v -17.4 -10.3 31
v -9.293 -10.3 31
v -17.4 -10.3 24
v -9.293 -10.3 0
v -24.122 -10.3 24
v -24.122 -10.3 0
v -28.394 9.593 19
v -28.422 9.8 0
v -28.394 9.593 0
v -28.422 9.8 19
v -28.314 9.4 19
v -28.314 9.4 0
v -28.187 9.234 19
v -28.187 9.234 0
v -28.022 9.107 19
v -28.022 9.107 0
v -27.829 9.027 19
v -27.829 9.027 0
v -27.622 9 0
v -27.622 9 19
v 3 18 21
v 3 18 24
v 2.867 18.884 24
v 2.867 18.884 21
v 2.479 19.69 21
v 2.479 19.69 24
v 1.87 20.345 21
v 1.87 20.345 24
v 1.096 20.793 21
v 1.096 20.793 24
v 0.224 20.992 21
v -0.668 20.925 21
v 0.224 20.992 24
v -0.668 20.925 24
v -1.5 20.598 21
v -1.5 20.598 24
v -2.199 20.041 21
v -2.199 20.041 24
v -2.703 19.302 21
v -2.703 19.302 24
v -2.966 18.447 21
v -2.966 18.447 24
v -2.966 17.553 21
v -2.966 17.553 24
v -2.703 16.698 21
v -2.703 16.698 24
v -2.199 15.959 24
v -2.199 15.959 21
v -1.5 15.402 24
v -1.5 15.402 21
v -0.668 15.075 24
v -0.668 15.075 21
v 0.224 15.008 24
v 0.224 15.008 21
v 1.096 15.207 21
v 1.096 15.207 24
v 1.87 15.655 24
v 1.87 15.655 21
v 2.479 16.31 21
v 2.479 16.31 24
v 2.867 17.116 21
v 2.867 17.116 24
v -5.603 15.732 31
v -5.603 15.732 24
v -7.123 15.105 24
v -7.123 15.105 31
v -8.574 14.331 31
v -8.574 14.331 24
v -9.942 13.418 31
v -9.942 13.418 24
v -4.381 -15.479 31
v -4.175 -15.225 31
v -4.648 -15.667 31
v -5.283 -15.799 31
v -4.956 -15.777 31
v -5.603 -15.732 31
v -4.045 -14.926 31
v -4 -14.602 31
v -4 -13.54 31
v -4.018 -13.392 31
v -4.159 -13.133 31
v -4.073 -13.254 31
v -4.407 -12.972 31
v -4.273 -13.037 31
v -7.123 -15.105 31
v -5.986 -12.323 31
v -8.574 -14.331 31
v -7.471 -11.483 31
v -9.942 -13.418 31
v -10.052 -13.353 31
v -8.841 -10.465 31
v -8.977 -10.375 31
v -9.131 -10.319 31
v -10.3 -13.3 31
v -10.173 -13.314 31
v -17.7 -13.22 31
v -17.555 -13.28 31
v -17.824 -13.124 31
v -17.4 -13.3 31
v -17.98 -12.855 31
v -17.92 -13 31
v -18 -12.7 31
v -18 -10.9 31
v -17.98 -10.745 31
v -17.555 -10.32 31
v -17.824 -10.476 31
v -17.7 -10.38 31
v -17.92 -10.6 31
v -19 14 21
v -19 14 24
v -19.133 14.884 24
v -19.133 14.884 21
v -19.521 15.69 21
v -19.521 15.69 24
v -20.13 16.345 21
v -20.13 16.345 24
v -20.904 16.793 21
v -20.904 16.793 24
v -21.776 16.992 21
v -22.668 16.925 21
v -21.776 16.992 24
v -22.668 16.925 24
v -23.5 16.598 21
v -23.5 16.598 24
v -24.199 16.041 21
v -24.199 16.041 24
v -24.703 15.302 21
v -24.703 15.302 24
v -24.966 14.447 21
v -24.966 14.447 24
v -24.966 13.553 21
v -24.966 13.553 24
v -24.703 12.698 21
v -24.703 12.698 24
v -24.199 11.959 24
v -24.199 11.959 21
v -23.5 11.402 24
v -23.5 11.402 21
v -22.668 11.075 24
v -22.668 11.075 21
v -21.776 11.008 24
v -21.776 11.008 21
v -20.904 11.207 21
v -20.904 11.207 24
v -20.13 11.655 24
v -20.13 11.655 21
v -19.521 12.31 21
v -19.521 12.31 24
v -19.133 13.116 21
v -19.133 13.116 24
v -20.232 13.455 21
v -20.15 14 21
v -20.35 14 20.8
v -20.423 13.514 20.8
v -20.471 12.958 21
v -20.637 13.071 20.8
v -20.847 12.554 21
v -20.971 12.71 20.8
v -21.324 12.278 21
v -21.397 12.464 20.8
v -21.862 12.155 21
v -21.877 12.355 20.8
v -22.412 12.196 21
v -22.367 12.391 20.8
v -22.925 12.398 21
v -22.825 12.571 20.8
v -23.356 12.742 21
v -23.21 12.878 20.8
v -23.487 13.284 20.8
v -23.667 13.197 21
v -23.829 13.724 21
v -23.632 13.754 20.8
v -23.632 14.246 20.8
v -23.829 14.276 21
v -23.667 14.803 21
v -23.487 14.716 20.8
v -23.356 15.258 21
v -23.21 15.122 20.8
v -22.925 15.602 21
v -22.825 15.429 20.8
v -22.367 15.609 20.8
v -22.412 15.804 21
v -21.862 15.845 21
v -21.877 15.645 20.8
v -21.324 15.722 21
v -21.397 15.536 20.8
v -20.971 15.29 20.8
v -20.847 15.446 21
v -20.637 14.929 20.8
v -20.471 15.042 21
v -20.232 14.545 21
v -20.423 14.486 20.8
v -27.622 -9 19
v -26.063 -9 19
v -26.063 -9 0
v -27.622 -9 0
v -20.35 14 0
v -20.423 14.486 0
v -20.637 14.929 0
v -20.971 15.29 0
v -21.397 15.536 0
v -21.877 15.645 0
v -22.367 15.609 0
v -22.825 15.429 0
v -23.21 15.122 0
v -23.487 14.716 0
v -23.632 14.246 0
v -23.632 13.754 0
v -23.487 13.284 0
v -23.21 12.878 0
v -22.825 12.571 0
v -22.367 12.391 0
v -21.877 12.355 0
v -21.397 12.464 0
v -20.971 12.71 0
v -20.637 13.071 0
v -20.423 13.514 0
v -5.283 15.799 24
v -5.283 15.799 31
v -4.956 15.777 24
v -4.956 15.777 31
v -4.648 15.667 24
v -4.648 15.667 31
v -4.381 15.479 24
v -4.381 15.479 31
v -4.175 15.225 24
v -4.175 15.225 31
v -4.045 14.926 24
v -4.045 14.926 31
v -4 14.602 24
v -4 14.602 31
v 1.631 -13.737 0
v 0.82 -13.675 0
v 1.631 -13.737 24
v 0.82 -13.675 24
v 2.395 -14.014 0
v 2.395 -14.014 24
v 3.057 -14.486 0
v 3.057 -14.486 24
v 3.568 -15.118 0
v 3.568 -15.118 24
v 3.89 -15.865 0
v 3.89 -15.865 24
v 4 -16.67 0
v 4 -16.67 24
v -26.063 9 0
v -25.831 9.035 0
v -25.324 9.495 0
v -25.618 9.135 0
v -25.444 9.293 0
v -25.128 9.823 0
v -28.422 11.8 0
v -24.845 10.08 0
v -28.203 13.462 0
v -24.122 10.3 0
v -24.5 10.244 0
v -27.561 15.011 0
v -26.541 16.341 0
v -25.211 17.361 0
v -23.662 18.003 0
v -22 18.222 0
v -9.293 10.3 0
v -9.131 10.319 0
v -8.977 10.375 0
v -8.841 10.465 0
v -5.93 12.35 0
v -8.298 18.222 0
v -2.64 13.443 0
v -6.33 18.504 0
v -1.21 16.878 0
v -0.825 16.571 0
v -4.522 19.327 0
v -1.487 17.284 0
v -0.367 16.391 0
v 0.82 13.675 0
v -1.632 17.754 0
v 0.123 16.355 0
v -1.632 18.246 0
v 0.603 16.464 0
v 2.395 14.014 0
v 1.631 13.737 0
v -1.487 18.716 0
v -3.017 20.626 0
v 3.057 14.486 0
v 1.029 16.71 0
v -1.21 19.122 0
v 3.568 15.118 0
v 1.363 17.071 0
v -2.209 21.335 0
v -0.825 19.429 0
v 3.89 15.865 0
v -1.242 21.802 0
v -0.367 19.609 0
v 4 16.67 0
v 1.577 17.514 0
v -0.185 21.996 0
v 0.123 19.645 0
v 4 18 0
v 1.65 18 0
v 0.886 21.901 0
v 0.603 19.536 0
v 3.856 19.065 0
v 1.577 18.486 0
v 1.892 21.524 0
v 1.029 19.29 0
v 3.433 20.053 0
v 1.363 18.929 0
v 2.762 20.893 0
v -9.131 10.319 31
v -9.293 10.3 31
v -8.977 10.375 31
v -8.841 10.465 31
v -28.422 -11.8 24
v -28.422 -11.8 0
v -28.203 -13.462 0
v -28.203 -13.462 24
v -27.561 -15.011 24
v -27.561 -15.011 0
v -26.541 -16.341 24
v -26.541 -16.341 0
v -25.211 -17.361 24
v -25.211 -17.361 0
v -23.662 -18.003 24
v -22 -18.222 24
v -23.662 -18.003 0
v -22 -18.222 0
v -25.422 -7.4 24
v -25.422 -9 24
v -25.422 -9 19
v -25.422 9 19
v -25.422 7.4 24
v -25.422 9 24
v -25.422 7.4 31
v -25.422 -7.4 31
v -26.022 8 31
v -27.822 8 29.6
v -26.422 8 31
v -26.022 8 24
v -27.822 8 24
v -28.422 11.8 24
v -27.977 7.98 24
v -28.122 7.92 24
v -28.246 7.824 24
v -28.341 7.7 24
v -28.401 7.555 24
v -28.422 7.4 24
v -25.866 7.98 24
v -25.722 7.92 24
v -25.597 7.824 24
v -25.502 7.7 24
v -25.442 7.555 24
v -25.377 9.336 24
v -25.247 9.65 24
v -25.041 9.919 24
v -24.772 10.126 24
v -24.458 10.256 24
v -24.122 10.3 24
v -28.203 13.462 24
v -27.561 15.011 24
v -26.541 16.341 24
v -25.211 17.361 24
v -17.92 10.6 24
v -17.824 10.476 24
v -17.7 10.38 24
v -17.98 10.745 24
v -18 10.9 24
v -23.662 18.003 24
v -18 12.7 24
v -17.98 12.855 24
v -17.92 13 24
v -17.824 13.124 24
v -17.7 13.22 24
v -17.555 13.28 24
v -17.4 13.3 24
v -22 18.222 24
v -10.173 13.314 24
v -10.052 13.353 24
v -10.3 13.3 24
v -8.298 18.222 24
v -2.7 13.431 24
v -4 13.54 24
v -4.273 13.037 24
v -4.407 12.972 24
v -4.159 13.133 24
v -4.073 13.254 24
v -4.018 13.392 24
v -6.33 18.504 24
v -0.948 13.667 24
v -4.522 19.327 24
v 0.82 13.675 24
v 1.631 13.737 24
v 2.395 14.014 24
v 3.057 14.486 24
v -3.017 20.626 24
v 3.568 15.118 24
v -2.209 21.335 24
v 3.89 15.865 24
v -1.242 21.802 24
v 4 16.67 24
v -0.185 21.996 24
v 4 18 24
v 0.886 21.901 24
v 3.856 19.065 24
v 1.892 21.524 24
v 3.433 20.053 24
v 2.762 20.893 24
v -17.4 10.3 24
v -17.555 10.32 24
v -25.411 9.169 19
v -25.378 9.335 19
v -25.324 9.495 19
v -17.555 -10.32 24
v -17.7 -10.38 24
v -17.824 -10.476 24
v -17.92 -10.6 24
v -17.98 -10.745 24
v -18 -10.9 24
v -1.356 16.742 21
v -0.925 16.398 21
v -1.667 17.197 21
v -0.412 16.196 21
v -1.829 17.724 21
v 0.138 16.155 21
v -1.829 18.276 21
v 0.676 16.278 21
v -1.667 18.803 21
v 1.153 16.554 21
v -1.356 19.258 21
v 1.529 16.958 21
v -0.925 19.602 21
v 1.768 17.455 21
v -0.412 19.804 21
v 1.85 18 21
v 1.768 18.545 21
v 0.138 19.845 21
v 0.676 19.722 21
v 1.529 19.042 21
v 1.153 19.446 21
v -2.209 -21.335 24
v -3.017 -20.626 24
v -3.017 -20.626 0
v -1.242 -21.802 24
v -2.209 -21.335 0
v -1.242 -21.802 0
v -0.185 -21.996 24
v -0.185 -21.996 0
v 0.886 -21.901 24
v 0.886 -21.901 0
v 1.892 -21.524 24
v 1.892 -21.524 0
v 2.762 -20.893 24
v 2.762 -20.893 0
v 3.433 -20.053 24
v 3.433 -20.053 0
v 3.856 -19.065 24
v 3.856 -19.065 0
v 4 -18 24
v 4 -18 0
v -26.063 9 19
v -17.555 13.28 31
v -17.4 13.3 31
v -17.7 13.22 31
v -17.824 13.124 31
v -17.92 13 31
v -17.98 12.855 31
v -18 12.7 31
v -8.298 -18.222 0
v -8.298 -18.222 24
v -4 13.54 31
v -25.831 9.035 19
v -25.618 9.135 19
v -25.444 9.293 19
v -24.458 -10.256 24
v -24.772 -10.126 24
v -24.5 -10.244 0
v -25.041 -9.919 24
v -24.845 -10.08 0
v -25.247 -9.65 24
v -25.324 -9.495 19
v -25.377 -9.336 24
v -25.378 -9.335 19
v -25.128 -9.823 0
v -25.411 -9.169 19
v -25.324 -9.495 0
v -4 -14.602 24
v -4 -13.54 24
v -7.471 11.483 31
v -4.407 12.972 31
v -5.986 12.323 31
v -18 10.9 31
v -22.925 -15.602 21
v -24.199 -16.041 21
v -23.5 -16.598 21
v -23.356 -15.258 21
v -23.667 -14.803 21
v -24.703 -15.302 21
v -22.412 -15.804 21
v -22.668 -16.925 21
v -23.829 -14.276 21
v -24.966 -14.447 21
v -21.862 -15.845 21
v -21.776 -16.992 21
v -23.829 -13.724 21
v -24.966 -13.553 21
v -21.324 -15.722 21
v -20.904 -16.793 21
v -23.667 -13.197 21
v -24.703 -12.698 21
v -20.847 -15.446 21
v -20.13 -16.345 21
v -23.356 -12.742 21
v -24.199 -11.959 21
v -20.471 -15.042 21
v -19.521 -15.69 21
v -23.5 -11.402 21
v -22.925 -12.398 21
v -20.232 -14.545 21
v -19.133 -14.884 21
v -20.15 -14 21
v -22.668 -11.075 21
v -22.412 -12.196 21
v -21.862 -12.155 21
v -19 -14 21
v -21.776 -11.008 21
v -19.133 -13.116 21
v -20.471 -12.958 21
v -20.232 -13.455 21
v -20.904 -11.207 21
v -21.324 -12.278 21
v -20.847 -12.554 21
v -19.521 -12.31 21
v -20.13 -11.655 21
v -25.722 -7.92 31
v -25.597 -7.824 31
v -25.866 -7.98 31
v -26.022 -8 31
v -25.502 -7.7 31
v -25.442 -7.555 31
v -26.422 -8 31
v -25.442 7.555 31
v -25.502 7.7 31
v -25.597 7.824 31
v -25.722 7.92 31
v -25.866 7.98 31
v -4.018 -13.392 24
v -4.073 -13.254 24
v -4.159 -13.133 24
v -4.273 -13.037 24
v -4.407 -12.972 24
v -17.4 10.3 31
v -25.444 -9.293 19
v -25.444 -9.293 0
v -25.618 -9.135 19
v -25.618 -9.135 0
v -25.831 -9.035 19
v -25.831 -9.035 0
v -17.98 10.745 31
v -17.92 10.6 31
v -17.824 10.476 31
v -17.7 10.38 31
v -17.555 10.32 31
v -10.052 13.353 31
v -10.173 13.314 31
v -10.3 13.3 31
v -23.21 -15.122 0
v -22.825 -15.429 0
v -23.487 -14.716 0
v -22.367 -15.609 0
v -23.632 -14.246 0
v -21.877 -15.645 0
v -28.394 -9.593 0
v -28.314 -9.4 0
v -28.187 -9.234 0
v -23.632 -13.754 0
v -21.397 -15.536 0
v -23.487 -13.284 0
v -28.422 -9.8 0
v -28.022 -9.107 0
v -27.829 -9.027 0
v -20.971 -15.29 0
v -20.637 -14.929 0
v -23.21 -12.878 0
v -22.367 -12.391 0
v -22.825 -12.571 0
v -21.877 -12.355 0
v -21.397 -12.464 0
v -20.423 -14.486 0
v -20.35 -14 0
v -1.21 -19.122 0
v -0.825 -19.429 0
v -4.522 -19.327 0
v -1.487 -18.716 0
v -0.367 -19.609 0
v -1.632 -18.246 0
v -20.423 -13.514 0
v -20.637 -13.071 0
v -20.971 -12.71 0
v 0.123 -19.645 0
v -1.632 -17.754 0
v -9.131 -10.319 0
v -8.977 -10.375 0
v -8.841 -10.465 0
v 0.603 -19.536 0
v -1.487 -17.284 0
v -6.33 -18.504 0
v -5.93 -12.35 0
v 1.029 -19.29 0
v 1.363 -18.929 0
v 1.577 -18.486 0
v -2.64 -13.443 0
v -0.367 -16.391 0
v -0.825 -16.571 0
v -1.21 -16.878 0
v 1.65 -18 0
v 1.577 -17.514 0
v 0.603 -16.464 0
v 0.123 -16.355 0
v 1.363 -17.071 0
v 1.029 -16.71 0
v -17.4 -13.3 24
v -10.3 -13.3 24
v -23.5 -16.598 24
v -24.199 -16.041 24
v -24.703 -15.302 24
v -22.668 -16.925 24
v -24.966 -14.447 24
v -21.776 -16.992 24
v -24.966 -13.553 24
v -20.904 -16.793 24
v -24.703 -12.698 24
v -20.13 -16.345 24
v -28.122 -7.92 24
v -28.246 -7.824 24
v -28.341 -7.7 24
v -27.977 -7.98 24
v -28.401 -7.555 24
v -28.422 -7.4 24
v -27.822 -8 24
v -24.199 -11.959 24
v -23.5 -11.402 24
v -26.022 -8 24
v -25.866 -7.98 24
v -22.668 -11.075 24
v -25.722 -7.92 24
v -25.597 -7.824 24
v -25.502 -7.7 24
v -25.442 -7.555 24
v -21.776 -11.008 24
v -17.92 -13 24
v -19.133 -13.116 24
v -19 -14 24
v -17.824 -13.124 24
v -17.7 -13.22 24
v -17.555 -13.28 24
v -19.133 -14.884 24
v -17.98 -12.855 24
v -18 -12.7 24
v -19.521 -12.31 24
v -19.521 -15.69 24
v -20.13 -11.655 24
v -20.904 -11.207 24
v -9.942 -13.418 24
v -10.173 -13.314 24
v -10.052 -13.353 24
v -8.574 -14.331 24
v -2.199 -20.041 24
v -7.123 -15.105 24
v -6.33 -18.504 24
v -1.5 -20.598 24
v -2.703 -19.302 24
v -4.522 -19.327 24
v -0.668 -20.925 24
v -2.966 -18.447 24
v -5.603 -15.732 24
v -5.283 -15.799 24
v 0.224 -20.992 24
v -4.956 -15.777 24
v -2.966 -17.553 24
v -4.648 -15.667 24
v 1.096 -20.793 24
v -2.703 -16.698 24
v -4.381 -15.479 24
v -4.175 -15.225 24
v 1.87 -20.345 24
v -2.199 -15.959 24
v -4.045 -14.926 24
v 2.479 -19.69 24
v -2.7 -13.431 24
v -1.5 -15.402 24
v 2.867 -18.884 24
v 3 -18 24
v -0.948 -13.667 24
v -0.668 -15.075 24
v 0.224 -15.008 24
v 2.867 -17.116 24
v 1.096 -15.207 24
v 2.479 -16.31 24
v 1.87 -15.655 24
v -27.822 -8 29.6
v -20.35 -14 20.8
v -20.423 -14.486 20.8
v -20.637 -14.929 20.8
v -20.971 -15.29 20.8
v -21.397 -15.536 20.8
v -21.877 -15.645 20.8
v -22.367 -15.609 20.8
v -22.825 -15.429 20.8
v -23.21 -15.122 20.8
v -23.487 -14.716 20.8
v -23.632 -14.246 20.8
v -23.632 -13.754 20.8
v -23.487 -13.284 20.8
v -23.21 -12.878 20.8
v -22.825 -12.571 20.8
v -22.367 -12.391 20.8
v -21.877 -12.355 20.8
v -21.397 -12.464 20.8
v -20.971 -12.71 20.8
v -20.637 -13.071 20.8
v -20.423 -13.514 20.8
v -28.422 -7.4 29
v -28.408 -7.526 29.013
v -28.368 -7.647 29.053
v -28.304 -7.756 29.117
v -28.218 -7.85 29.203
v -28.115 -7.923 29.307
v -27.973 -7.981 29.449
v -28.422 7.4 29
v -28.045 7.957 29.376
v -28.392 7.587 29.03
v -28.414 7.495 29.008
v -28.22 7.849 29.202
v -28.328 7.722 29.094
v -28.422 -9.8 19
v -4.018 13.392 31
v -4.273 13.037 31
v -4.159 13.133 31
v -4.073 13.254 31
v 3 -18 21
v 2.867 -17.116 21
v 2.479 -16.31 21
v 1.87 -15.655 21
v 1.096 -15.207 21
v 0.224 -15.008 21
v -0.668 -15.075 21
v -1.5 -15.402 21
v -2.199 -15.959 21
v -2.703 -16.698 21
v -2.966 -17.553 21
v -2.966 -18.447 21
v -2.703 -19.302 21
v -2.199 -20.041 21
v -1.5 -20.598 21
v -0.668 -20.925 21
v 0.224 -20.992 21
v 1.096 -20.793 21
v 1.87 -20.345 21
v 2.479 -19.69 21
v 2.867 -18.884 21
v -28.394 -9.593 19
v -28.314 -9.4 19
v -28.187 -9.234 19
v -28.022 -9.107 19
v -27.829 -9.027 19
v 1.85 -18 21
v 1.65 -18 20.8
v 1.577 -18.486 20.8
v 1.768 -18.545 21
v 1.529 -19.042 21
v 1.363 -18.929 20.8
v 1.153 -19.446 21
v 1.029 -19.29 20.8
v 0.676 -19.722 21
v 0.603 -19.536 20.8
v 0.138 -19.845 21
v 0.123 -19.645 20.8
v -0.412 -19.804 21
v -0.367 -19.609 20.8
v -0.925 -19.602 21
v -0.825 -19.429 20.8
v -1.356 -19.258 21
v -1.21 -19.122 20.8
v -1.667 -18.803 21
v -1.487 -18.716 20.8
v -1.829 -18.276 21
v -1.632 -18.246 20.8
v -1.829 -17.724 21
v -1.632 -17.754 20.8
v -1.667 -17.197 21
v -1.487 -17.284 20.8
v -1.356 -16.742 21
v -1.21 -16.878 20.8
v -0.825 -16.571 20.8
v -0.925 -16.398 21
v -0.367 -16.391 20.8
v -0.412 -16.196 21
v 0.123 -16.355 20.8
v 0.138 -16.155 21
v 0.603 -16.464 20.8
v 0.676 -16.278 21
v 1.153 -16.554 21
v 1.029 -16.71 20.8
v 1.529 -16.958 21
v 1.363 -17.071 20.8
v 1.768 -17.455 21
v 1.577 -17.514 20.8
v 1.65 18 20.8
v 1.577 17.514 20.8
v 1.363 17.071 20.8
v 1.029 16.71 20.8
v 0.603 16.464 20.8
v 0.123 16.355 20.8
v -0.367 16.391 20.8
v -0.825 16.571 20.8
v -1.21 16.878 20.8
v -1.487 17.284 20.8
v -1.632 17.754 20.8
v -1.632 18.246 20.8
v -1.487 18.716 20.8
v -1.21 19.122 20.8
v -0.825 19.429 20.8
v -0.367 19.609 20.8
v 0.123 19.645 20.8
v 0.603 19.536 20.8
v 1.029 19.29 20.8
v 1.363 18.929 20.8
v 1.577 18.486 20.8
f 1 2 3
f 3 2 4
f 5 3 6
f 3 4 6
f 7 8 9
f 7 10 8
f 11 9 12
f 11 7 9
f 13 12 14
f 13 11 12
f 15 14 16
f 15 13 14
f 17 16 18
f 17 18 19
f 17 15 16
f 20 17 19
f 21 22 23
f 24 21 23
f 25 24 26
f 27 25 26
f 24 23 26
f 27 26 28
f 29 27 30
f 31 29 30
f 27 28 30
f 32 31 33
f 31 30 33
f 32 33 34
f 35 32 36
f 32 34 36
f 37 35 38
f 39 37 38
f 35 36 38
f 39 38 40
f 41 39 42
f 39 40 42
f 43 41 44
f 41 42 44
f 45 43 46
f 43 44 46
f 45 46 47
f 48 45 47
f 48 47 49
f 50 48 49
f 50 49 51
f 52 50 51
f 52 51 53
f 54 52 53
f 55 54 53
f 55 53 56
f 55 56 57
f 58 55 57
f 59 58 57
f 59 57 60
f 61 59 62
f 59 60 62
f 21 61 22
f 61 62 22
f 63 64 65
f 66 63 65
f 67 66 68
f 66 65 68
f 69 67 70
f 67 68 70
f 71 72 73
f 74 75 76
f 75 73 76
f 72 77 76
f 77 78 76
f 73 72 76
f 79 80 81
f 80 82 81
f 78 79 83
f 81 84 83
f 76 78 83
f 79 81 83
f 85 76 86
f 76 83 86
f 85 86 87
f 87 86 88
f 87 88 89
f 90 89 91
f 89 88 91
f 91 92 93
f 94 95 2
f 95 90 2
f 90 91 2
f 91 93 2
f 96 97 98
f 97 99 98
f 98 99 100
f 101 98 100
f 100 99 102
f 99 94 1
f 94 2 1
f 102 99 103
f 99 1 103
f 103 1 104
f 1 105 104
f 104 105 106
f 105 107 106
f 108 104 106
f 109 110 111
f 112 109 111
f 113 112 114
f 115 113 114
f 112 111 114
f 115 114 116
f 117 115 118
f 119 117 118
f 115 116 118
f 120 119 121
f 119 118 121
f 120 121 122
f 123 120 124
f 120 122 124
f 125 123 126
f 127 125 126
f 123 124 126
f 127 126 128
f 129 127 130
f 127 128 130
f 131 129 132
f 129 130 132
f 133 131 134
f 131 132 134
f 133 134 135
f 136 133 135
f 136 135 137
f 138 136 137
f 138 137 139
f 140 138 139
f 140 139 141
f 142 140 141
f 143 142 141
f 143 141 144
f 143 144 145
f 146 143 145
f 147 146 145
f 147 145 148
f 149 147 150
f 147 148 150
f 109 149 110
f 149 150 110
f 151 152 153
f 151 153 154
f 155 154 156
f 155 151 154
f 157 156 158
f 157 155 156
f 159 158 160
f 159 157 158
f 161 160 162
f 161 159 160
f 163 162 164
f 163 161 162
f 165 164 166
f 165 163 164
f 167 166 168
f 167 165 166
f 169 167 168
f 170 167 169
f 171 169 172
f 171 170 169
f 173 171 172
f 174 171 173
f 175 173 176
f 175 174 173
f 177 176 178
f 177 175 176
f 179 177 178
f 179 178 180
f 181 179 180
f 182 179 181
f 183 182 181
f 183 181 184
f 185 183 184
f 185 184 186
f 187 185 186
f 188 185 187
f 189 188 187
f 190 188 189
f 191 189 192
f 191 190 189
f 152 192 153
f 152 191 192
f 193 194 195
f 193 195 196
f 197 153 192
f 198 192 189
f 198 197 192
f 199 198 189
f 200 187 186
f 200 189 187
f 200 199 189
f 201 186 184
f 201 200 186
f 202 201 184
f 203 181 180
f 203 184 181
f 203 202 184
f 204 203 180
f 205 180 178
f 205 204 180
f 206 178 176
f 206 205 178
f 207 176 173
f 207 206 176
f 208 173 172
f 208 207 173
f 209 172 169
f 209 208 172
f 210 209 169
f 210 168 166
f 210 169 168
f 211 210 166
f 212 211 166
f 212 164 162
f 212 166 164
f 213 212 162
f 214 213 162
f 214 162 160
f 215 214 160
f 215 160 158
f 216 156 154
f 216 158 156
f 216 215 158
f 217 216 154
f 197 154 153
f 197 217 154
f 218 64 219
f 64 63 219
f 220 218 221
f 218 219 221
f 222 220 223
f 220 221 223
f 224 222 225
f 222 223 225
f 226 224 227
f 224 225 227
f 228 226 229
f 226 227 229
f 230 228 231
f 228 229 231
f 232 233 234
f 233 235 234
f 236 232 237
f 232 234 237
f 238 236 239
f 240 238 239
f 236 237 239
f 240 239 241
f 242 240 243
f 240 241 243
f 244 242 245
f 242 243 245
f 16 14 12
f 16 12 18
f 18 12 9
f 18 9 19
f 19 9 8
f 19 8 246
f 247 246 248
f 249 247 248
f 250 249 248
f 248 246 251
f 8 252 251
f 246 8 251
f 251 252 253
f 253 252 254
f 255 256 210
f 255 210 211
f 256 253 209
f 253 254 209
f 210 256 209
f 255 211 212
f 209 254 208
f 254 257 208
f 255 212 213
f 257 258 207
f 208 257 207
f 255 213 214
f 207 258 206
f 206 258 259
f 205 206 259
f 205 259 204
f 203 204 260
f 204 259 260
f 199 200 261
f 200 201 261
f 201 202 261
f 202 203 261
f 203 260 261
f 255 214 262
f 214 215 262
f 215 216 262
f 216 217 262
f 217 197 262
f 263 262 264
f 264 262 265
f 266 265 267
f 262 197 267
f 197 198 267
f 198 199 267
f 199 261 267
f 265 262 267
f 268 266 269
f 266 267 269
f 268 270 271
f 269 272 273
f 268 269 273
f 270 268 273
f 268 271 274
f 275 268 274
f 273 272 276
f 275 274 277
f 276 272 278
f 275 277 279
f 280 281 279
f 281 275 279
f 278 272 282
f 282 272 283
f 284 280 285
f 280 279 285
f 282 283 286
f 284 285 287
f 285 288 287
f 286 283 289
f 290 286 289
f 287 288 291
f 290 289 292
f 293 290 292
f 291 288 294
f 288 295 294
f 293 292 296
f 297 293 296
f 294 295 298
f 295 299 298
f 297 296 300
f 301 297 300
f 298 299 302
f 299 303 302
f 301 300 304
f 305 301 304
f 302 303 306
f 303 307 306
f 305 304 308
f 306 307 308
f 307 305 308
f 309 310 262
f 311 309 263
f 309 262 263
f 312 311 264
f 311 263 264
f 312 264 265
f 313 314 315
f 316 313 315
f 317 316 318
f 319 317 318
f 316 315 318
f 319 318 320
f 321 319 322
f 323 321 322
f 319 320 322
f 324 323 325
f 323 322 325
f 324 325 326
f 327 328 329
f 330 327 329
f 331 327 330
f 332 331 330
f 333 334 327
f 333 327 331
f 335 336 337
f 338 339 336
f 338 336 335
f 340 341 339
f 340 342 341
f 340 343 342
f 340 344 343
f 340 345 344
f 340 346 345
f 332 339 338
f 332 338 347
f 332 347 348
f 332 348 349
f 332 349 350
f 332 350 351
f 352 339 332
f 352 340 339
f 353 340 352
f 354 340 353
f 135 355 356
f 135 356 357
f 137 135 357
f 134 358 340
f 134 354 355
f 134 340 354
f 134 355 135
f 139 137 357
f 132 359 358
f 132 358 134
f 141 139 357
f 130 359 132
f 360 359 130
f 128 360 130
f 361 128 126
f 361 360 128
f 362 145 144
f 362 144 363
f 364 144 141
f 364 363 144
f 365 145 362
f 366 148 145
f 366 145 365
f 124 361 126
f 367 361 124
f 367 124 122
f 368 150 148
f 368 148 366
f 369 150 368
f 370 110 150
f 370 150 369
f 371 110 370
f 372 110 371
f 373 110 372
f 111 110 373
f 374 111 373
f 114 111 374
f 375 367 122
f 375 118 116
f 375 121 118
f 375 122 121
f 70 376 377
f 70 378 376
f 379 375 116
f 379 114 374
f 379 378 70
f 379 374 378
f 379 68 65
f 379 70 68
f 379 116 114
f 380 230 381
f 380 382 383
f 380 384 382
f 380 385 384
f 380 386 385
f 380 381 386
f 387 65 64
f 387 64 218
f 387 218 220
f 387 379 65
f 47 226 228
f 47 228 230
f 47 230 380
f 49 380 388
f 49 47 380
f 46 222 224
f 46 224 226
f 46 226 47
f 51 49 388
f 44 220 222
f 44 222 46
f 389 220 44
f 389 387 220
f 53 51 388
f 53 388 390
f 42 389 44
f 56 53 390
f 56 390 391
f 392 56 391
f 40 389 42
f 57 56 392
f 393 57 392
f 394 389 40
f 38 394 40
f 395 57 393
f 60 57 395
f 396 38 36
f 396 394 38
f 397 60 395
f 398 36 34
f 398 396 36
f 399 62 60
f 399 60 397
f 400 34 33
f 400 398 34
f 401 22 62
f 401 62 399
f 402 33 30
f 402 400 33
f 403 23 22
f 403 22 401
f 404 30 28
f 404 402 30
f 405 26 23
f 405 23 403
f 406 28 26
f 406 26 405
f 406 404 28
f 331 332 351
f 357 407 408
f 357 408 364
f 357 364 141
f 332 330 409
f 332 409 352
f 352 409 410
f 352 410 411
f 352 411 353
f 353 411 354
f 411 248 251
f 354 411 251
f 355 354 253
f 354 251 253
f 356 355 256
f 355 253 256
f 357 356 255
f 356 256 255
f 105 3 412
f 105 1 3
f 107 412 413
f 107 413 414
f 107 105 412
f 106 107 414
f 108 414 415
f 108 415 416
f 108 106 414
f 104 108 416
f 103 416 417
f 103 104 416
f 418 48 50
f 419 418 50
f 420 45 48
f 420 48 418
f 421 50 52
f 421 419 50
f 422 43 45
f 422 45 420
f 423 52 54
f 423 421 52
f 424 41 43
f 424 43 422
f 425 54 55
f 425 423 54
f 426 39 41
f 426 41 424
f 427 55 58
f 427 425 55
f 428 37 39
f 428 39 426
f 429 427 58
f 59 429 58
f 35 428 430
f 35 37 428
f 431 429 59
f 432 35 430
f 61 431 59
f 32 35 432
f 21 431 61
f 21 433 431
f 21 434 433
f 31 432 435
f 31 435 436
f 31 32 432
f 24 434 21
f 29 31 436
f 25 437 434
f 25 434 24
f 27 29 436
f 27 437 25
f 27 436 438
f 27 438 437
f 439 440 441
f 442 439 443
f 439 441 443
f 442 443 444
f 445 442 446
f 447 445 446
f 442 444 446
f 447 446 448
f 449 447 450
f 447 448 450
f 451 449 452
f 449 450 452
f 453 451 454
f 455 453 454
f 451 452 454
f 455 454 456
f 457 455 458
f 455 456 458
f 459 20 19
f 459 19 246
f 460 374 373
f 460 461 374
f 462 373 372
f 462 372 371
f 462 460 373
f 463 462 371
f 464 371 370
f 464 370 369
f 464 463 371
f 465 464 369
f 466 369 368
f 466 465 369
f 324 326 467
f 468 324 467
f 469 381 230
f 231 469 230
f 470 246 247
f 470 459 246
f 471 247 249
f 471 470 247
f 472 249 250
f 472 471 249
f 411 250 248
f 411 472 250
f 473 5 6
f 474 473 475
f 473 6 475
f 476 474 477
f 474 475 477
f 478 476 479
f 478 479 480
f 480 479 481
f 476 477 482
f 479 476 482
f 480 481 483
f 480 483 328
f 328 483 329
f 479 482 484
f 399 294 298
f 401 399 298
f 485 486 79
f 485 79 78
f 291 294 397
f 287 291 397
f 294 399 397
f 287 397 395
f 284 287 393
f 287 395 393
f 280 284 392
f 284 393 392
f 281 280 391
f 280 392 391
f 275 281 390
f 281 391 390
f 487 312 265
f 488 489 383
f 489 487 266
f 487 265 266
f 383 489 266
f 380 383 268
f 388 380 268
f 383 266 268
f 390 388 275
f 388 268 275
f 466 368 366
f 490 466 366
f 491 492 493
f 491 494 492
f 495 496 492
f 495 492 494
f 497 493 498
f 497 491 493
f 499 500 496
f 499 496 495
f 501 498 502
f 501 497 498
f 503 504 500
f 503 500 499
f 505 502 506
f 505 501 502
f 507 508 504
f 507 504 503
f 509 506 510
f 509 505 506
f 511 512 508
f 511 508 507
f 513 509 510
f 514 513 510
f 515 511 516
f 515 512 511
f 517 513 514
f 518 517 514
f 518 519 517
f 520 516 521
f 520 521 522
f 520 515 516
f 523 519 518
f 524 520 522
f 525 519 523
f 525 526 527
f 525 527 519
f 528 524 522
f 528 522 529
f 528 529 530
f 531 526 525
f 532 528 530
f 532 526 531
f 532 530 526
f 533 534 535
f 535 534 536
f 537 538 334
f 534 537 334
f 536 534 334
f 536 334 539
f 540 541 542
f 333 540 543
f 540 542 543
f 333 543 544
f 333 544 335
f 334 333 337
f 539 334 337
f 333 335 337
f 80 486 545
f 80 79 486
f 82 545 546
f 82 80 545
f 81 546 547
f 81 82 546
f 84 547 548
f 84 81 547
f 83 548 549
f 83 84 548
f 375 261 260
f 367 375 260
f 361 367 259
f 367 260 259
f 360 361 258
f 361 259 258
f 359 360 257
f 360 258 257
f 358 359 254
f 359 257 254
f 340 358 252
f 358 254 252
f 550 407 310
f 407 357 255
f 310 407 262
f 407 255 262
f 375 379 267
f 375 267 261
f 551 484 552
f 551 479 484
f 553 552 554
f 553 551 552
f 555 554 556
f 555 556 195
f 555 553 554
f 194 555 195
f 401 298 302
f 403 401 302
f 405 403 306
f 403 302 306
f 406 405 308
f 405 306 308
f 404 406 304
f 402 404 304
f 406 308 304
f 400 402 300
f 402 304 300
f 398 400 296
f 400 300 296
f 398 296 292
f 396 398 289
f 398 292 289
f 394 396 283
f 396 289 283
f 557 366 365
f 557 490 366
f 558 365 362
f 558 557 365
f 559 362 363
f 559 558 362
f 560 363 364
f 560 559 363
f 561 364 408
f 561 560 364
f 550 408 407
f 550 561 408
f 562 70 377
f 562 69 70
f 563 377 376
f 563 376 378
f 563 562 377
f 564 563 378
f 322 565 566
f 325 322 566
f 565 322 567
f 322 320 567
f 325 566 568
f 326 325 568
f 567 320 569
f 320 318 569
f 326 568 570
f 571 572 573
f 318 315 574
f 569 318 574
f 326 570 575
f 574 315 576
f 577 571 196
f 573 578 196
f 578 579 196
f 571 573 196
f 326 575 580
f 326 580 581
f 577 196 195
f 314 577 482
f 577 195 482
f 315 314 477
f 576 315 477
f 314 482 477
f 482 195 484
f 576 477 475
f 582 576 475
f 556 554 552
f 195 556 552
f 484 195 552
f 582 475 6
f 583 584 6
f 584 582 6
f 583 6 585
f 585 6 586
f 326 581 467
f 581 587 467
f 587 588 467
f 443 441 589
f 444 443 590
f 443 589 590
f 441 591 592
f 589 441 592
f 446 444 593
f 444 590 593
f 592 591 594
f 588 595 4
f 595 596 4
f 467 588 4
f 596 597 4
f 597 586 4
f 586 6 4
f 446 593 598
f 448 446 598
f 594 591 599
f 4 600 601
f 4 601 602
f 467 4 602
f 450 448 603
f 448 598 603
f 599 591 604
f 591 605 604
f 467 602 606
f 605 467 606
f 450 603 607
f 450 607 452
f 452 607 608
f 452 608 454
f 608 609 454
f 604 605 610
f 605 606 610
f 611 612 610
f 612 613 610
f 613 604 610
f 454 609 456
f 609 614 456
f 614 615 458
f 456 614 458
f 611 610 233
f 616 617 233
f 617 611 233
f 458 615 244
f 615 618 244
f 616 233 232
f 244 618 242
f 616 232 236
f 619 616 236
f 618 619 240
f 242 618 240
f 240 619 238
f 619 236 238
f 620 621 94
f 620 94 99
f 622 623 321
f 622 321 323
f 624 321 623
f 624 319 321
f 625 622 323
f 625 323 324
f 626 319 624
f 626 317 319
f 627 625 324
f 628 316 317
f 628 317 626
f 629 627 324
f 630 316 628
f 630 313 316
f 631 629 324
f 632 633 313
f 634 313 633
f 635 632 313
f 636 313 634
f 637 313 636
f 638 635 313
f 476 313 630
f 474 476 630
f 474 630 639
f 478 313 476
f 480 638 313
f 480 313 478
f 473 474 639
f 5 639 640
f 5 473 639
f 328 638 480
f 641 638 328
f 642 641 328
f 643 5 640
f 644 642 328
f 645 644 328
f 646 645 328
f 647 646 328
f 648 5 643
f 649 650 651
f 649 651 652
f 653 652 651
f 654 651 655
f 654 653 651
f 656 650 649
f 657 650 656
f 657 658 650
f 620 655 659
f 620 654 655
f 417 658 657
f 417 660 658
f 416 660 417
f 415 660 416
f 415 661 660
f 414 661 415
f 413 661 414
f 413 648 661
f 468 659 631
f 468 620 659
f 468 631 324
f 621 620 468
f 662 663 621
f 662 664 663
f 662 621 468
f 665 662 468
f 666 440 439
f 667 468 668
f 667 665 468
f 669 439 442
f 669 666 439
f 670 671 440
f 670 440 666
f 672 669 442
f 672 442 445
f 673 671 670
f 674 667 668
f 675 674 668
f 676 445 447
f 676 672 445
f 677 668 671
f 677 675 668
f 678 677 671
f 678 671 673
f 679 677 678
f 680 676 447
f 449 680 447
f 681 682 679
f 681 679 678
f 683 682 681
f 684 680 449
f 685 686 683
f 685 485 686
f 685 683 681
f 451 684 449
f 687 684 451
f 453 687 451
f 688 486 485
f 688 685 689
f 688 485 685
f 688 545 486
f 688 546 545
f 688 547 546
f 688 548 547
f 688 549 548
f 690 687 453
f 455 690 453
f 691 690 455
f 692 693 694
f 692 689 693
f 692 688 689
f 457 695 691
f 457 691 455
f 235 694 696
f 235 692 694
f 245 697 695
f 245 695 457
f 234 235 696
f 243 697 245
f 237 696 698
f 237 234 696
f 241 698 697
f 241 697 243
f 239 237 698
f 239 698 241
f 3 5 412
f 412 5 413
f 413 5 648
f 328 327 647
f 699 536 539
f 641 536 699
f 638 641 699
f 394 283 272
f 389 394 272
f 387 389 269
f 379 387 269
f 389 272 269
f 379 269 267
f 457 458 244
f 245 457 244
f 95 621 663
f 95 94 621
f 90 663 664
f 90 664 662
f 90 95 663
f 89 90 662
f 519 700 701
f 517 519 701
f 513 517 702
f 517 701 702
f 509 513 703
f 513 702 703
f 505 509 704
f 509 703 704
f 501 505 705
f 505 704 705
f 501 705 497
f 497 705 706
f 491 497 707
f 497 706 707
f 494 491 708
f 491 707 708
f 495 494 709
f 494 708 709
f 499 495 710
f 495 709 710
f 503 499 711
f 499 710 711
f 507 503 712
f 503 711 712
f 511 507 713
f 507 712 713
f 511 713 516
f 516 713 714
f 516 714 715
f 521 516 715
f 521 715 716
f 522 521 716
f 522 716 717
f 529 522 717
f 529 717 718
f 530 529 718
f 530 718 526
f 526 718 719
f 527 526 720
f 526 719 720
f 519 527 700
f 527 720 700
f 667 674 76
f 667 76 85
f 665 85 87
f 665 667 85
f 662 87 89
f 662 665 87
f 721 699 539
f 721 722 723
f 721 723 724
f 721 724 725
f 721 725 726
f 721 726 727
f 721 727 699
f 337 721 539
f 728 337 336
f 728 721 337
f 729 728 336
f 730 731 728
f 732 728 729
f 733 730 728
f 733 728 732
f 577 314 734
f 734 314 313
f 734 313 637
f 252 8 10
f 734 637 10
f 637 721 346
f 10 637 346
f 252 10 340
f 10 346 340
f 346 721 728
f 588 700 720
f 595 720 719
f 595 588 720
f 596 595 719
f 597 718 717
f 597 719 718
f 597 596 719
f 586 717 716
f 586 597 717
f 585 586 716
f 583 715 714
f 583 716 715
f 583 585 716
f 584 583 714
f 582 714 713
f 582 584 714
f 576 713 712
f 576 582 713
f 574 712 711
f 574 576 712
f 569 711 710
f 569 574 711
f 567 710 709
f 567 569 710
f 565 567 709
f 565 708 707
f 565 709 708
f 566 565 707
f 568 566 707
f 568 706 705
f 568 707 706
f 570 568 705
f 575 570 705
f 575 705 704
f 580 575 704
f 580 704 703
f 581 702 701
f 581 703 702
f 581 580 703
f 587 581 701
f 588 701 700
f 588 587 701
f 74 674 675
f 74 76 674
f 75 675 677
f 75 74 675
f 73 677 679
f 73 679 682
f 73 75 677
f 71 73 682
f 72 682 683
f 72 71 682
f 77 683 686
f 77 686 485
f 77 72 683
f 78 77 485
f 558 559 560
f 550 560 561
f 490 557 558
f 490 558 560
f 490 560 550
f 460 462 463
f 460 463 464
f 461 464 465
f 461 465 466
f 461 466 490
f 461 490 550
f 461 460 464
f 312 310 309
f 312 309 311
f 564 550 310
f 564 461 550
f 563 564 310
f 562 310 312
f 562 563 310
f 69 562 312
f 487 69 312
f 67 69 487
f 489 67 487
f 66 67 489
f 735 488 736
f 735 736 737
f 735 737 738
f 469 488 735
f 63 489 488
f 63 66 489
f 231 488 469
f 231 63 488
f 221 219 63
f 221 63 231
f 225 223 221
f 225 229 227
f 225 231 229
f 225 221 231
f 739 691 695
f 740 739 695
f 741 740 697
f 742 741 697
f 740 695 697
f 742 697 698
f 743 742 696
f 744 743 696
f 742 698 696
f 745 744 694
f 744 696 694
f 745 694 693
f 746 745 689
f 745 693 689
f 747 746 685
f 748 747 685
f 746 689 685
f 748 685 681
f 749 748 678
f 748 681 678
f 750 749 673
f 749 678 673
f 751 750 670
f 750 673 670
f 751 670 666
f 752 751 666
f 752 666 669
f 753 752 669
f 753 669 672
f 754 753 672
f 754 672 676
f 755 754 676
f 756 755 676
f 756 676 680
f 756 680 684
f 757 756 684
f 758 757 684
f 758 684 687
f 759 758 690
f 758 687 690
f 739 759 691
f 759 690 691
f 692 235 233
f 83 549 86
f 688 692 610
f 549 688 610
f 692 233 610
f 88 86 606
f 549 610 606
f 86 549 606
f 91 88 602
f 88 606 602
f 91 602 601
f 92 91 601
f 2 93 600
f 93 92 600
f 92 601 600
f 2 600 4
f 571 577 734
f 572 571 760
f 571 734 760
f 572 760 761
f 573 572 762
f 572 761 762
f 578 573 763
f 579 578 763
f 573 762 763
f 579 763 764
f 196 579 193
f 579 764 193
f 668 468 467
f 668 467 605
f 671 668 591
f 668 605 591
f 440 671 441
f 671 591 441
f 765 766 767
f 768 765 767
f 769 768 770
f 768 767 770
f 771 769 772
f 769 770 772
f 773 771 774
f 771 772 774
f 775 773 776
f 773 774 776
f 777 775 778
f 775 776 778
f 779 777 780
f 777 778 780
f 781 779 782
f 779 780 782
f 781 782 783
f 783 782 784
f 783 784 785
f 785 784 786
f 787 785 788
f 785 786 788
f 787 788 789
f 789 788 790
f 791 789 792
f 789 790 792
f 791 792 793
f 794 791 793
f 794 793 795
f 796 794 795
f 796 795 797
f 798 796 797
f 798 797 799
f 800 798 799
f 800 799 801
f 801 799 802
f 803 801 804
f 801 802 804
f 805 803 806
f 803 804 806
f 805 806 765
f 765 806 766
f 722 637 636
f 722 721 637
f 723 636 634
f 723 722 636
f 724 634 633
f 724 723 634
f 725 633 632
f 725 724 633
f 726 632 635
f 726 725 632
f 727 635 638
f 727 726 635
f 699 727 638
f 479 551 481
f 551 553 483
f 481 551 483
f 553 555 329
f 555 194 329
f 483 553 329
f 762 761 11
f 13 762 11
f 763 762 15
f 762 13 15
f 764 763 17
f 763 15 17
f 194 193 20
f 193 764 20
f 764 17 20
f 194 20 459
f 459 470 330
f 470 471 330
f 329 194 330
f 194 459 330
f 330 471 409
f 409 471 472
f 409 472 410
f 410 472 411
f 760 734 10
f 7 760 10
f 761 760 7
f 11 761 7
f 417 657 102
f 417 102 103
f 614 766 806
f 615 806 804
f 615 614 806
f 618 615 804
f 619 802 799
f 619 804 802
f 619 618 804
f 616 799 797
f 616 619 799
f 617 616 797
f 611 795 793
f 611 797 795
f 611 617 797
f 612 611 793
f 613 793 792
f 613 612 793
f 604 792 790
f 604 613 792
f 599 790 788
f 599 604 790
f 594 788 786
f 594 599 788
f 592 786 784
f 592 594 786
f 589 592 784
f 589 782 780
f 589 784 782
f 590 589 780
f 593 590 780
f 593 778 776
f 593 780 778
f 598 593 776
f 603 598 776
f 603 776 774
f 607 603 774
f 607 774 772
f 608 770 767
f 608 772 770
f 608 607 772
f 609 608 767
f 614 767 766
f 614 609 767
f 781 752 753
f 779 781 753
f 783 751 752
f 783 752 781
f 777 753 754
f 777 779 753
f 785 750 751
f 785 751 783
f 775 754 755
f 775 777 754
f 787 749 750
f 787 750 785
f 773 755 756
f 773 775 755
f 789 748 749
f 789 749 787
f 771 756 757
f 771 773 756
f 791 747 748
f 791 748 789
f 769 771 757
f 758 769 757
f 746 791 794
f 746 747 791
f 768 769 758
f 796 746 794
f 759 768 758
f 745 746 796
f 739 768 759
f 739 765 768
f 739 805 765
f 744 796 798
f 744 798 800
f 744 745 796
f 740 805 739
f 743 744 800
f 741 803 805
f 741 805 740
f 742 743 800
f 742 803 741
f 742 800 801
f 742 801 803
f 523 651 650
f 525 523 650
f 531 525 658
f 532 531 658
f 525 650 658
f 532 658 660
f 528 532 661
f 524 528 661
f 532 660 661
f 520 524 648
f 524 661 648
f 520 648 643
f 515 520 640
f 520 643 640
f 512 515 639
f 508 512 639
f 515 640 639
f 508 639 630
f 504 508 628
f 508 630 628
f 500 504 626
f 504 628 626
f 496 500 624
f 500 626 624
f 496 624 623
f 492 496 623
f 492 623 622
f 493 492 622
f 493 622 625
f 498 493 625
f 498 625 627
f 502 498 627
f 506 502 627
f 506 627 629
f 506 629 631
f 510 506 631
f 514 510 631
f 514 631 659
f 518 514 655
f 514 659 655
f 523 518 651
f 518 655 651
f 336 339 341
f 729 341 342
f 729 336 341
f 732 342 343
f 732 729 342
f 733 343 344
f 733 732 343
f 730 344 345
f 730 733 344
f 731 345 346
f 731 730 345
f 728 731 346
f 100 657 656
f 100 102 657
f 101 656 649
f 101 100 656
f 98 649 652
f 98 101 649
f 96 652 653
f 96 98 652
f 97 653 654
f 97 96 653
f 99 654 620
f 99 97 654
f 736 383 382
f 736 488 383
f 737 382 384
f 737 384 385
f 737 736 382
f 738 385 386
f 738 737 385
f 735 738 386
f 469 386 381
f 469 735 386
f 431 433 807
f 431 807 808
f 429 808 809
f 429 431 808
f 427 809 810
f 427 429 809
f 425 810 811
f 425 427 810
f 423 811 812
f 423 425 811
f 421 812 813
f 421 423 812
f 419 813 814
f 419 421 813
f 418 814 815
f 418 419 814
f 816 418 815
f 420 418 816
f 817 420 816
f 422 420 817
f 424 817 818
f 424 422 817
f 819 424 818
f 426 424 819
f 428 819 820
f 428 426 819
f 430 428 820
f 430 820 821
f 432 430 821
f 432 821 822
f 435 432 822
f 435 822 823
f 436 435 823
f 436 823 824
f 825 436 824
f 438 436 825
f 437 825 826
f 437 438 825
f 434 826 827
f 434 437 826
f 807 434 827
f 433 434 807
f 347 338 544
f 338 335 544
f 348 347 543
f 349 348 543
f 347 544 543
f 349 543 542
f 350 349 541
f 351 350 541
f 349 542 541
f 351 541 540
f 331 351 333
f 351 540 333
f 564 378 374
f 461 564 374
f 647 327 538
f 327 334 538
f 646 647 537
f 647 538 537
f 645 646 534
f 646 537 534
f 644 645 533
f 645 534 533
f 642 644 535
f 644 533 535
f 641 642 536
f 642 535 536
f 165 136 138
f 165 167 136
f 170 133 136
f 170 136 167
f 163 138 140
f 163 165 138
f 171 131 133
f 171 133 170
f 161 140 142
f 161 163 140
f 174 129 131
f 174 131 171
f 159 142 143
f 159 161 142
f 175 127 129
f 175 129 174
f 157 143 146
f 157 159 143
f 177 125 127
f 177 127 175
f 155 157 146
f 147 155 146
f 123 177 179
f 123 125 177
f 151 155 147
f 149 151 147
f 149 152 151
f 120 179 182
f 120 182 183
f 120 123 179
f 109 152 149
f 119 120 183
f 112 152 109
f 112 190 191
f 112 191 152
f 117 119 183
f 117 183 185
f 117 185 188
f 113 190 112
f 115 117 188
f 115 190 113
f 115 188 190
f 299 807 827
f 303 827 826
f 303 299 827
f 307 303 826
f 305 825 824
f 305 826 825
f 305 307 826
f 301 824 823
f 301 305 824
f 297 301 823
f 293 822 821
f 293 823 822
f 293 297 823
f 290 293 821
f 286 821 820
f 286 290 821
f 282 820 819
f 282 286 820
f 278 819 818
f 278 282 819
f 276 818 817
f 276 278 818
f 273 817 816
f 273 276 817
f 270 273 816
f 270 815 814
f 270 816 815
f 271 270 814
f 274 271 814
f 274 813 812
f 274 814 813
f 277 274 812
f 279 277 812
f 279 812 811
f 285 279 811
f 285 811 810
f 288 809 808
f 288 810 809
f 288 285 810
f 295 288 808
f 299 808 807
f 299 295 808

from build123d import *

# Parameters (mm, degrees)
SKETCH1_R             = 1.6499999999999988
SKETCH1_R_2           = 1.6499999999999992
BOSS_EXTRUDE1_DEPTH   = 24
BOSS_EXTRUDE1_2_DEPTH = 24
SKETCH5_R             = 3.0000000000000044
SKETCH5_R_2           = 2.9999999999999996
CUT_EXTRUDE1_DEPTH    = 3
SKETCH6_W             = 2.999999999999975
SKETCH6_H             = 17.999999999999996
BOSS_EXTRUDE2_DEPTH   = 5
FILLET1_R             = 3
BOSS_EXTRUDE3_DEPTH   = 7
CHAMFER1_SIZE         = 2
FILLET2_R             = 0.6
FILLET3_R             = 1.2
CHAMFER2_SIZE         = 0.2
FILLET4_R             = 0.8


with BuildPart() as part:
    # Sketch1 → Boss-Extrude1 (new body)
    with BuildSketch(Plane.XY):
        with BuildLine():
            Line((-24.12157620169872, 10.3), (-9.293008124391159, 10.3))
            ThreePointArc((-9.293008124391159, 10.3), (-9.052493629563461, 10.342616719274229), (-8.841264673899918, 10.465277777777773))
            ThreePointArc((-8.84126467389991, 10.465277777777777), (-2.7566148708280886, 13.419801580274177), (4.000000000000017, 13.103053079339933))
            Line((4.000000000000019, 13.103053079339944), (4.000000000000019, 18))
            ThreePointArc((4.0000000000000195, 18), (1.4019415263376545, 21.7462728086366), (-3.0172799783650257, 20.626027709708623))
            ThreePointArc((-3.017279978365025, 20.626027709708623), (-5.396557983146459, 18.850985983990057), (-8.297519940503818, 18.221576201698717))
            Line((-8.297519940503818, 18.22157620169872), (-22, 18.221576201698717))
            ThreePointArc((-22, 18.221576201698717), (-26.540740078127286, 16.340740078127293), (-28.42157620169869, 11.799999999999997))
            Line((-28.42157620169869, 11.799999999999997), (-28.421576201698695, 8.999999999999998))
            Line((-28.421576201698695, 8.999999999999998), (-25.42157620169872, 8.999999999999998))
            ThreePointArc((-25.42157620169872, 8.999999999999998), (-25.040815017241233, 9.919238815542512), (-24.12157620169872, 10.3))
        make_face()
        with Locations((-21.999999999999996, 14)):
            Circle(SKETCH1_R, mode=Mode.SUBTRACT)
        with Locations((-6.49e-15, 18)):
            Circle(SKETCH1_R_2, mode=Mode.SUBTRACT)
    extrude(amount=BOSS_EXTRUDE1_DEPTH)


with BuildPart() as body_2:
    # Sketch1 → Boss-Extrude1 2 (new body)
    with BuildSketch(Plane.XY):
        with BuildLine():
            ThreePointArc((-24.12157620169872, -10.299999999999999), (-25.040815017241233, -9.91923881554251), (-25.42157620169872, -8.999999999999998))
            Line((-25.42157620169872, -8.999999999999998), (-28.421576201698723, -8.999999999999998))
            Line((-28.421576201698723, -8.999999999999998), (-28.42157620169872, -11.799999999999997))
            ThreePointArc((-28.42157620169872, -11.799999999999997), (-26.540740078127314, -16.340740078127318), (-21.999999999999996, -18.22157620169873))
            Line((-21.999999999999996, -18.22157620169873), (-8.297519940503813, -18.221576201698728))
            ThreePointArc((-8.297519940503813, -18.221576201698728), (-5.3965579831464545, -18.850985983990064), (-3.0172799783650195, -20.62602770970863))
            ThreePointArc((-3.0172799783650204, -20.62602770970863), (1.4019415263376571, -21.74627280863661), (4.000000000000004, -18))
            Line((4.000000000000004, -18), (4.000000000000004, -13.103053079339944))
            ThreePointArc((4.000000000000004, -13.103053079339945), (-2.756614870828109, -13.41980158027418), (-8.841264673899921, -10.465277777777775))
            ThreePointArc((-8.841264673899923, -10.465277777777775), (-9.052493629563463, -10.342616719274227), (-9.293008124391159, -10.299999999999999))
            Line((-9.293008124391159, -10.299999999999999), (-24.12157620169872, -10.299999999999999))
        make_face()
        with Locations((-21.999999999999996, -14)):
            Circle(SKETCH1_R, mode=Mode.SUBTRACT)
        with Locations((4.53e-15, -18)):
            Circle(SKETCH1_R_2, mode=Mode.SUBTRACT)
    extrude(amount=BOSS_EXTRUDE1_2_DEPTH)


with BuildPart() as cut_extrude1_tool:
    # Sketch5 → Cut-Extrude1 (new body)
    with BuildSketch(Plane.XY.offset(24)):
        with Locations((-21.999999999999996, 14)):
            Circle(SKETCH5_R)
        with Locations((-6.49e-15, 18)):
            Circle(SKETCH5_R_2)
        with Locations((4.53e-15, -18)):
            Circle(SKETCH5_R_2)
        with Locations((-21.999999999999996, -14)):
            Circle(SKETCH5_R)
    extrude(amount=-CUT_EXTRUDE1_DEPTH)


with BuildPart() as part_1:
    add(part.part)

    # Cut-Extrude1: cut by cut_extrude1_tool
    add(cut_extrude1_tool.part, mode=Mode.SUBTRACT)



with BuildPart() as body_2_1:
    add(body_2.part)

    # Cut-Extrude1: cut by cut_extrude1_tool
    add(cut_extrude1_tool.part, mode=Mode.SUBTRACT)


with BuildPart() as part_2:
    add(part_1.part)

    add(body_2_1.part)  # Boss-Extrude2 merges body 2
    # Sketch6 → Boss-Extrude2 (add)
    with BuildSketch(Plane.XY.offset(24)):
        with Locations((-26.921576201698706, 0)):
            Rectangle(SKETCH6_W, SKETCH6_H)
    extrude(amount=-BOSS_EXTRUDE2_DEPTH)

    # Fillet1
    fillet1_edges = [part_2.edges().sort_by_distance(p)[0] for p in [
        (4.000000000000018, 13.103053079339938, 12),
        (4.0000000000000036, -13.103053079339944, 12),
    ]]
    fillet(fillet1_edges, radius=FILLET1_R)

    # Sketch7 → Boss-Extrude3 (add)
    with BuildSketch(Plane.XY.offset(24)):
        Polygon((-28.42157620169872, 8.000000000000004), (-25.42157620169872, 8.000000000000004), (-25.42157620169872, -7.9999999999999964), (-28.421576201698716, -7.9999999999999964), align=None)
        with BuildLine():
            Line((-17.999999999999996, 10.3), (-9.293008124391159, 10.3))
            ThreePointArc((-9.293008124391159, 10.3), (-9.052493629563465, 10.342616719274229), (-8.841264673899923, 10.465277777777771))
            ThreePointArc((-8.841264673899923, 10.465277777777771), (-6.554691773201115, 12.030212623155485), (-4, 13.103053079339944))
            Line((-4, 13.103053079339944), (-3.999999999999999, 16.21388294024599))
            ThreePointArc((-3.999999999999999, 16.21388294024599), (-7.198728243522483, 15.068786005379188), (-10.099504938362077, 13.299999999999999))
            Line((-10.099504938362077, 13.299999999999999), (-17.999999999999996, 13.299999999999999))
            Line((-17.999999999999996, 13.299999999999999), (-17.999999999999996, 10.3))
        make_face()
        with BuildLine():
            Line((-17.999999999999993, -10.300000000000004), (-9.293008124391159, -10.3))
            ThreePointArc((-9.293008124391159, -10.3), (-9.052493629563465, -10.342616719274229), (-8.841264673899923, -10.465277777777771))
            ThreePointArc((-8.841264673899923, -10.465277777777771), (-6.554691773201115, -12.030212623155485), (-4, -13.103053079339944))
            Line((-4, -13.103053079339944), (-3.9999999999999947, -16.21388294024599))
            ThreePointArc((-3.9999999999999947, -16.21388294024599), (-7.198728243522483, -15.068786005379188), (-10.099504938362074, -13.300000000000002))
            Line((-10.099504938362074, -13.300000000000002), (-17.999999999999993, -13.300000000000002))
            Line((-17.999999999999993, -13.300000000000002), (-17.999999999999993, -10.300000000000004))
        make_face()
    extrude(amount=BOSS_EXTRUDE3_DEPTH)

    # Chamfer1
    chamfer1_edges = [part_2.edges().sort_by_distance(p)[0] for p in [
        (-28.42157620169872, 3.55e-15, 31),
    ]]
    chamfer(chamfer1_edges, length=CHAMFER1_SIZE)

    # Fillet2
    fillet2_edges = [part_2.edges().sort_by_distance(p)[0] for p in [
        (-25.42157620169872, -7.9999999999999964, 27.5),
        (-25.42157620169872, 8.000000000000004, 27.5),
        (-17.999999999999996, 13.299999999999999, 27.5),
        (-17.999999999999996, 10.3, 27.5),
        (-3.9999999999999996, 13.103053079339945, 27.5),
        (-10.099504938362077, 13.299999999999999, 27.5),
        (-17.999999999999993, -10.300000000000004, 27.5),
        (-17.999999999999993, -13.300000000000002, 27.5),
        (-10.099504938362076, -13.3, 27.5),
        (-3.9999999999999996, -13.103053079339945, 27.5),
        (-28.421576201698716, -7.9999999999999964, 26.5),
        (-28.42157620169872, 8.000000000000004, 26.499999999999993),
    ]]
    fillet(fillet2_edges, radius=FILLET2_R)

    # Fillet3
    fillet3_edges = [part_2.edges().sort_by_distance(p)[0] for p in [
        (-3.999999999999999, 16.213882940245995, 27.5),
        (-3.9999999999999947, -16.21388294024599, 27.5),
    ]]
    fillet(fillet3_edges, radius=FILLET3_R)

    # Chamfer2
    chamfer2_edges = [part_2.edges().sort_by_distance(p)[0] for p in [
        (-23.649999999999995, 14, 21),
        (-1.6500000000000057, 18, 21),
        (-23.649999999999995, -14, 21),
        (-1.6499999999999948, -18, 21),
    ]]
    chamfer(chamfer2_edges, length=CHAMFER2_SIZE)

    # Fillet4
    fillet4_edges = [part_2.edges().sort_by_distance(p)[0] for p in [
        (-25.42157620169872, 8.999999999999998, 9.5),
        (-28.421576201698695, 8.999999999999998, 9.5),
        (-25.42157620169872, -8.999999999999998, 9.5),
        (-28.421576201698723, -8.999999999999998, 9.5),
    ]]
    fillet(fillet4_edges, radius=FILLET4_R)


solid = part_2.part
